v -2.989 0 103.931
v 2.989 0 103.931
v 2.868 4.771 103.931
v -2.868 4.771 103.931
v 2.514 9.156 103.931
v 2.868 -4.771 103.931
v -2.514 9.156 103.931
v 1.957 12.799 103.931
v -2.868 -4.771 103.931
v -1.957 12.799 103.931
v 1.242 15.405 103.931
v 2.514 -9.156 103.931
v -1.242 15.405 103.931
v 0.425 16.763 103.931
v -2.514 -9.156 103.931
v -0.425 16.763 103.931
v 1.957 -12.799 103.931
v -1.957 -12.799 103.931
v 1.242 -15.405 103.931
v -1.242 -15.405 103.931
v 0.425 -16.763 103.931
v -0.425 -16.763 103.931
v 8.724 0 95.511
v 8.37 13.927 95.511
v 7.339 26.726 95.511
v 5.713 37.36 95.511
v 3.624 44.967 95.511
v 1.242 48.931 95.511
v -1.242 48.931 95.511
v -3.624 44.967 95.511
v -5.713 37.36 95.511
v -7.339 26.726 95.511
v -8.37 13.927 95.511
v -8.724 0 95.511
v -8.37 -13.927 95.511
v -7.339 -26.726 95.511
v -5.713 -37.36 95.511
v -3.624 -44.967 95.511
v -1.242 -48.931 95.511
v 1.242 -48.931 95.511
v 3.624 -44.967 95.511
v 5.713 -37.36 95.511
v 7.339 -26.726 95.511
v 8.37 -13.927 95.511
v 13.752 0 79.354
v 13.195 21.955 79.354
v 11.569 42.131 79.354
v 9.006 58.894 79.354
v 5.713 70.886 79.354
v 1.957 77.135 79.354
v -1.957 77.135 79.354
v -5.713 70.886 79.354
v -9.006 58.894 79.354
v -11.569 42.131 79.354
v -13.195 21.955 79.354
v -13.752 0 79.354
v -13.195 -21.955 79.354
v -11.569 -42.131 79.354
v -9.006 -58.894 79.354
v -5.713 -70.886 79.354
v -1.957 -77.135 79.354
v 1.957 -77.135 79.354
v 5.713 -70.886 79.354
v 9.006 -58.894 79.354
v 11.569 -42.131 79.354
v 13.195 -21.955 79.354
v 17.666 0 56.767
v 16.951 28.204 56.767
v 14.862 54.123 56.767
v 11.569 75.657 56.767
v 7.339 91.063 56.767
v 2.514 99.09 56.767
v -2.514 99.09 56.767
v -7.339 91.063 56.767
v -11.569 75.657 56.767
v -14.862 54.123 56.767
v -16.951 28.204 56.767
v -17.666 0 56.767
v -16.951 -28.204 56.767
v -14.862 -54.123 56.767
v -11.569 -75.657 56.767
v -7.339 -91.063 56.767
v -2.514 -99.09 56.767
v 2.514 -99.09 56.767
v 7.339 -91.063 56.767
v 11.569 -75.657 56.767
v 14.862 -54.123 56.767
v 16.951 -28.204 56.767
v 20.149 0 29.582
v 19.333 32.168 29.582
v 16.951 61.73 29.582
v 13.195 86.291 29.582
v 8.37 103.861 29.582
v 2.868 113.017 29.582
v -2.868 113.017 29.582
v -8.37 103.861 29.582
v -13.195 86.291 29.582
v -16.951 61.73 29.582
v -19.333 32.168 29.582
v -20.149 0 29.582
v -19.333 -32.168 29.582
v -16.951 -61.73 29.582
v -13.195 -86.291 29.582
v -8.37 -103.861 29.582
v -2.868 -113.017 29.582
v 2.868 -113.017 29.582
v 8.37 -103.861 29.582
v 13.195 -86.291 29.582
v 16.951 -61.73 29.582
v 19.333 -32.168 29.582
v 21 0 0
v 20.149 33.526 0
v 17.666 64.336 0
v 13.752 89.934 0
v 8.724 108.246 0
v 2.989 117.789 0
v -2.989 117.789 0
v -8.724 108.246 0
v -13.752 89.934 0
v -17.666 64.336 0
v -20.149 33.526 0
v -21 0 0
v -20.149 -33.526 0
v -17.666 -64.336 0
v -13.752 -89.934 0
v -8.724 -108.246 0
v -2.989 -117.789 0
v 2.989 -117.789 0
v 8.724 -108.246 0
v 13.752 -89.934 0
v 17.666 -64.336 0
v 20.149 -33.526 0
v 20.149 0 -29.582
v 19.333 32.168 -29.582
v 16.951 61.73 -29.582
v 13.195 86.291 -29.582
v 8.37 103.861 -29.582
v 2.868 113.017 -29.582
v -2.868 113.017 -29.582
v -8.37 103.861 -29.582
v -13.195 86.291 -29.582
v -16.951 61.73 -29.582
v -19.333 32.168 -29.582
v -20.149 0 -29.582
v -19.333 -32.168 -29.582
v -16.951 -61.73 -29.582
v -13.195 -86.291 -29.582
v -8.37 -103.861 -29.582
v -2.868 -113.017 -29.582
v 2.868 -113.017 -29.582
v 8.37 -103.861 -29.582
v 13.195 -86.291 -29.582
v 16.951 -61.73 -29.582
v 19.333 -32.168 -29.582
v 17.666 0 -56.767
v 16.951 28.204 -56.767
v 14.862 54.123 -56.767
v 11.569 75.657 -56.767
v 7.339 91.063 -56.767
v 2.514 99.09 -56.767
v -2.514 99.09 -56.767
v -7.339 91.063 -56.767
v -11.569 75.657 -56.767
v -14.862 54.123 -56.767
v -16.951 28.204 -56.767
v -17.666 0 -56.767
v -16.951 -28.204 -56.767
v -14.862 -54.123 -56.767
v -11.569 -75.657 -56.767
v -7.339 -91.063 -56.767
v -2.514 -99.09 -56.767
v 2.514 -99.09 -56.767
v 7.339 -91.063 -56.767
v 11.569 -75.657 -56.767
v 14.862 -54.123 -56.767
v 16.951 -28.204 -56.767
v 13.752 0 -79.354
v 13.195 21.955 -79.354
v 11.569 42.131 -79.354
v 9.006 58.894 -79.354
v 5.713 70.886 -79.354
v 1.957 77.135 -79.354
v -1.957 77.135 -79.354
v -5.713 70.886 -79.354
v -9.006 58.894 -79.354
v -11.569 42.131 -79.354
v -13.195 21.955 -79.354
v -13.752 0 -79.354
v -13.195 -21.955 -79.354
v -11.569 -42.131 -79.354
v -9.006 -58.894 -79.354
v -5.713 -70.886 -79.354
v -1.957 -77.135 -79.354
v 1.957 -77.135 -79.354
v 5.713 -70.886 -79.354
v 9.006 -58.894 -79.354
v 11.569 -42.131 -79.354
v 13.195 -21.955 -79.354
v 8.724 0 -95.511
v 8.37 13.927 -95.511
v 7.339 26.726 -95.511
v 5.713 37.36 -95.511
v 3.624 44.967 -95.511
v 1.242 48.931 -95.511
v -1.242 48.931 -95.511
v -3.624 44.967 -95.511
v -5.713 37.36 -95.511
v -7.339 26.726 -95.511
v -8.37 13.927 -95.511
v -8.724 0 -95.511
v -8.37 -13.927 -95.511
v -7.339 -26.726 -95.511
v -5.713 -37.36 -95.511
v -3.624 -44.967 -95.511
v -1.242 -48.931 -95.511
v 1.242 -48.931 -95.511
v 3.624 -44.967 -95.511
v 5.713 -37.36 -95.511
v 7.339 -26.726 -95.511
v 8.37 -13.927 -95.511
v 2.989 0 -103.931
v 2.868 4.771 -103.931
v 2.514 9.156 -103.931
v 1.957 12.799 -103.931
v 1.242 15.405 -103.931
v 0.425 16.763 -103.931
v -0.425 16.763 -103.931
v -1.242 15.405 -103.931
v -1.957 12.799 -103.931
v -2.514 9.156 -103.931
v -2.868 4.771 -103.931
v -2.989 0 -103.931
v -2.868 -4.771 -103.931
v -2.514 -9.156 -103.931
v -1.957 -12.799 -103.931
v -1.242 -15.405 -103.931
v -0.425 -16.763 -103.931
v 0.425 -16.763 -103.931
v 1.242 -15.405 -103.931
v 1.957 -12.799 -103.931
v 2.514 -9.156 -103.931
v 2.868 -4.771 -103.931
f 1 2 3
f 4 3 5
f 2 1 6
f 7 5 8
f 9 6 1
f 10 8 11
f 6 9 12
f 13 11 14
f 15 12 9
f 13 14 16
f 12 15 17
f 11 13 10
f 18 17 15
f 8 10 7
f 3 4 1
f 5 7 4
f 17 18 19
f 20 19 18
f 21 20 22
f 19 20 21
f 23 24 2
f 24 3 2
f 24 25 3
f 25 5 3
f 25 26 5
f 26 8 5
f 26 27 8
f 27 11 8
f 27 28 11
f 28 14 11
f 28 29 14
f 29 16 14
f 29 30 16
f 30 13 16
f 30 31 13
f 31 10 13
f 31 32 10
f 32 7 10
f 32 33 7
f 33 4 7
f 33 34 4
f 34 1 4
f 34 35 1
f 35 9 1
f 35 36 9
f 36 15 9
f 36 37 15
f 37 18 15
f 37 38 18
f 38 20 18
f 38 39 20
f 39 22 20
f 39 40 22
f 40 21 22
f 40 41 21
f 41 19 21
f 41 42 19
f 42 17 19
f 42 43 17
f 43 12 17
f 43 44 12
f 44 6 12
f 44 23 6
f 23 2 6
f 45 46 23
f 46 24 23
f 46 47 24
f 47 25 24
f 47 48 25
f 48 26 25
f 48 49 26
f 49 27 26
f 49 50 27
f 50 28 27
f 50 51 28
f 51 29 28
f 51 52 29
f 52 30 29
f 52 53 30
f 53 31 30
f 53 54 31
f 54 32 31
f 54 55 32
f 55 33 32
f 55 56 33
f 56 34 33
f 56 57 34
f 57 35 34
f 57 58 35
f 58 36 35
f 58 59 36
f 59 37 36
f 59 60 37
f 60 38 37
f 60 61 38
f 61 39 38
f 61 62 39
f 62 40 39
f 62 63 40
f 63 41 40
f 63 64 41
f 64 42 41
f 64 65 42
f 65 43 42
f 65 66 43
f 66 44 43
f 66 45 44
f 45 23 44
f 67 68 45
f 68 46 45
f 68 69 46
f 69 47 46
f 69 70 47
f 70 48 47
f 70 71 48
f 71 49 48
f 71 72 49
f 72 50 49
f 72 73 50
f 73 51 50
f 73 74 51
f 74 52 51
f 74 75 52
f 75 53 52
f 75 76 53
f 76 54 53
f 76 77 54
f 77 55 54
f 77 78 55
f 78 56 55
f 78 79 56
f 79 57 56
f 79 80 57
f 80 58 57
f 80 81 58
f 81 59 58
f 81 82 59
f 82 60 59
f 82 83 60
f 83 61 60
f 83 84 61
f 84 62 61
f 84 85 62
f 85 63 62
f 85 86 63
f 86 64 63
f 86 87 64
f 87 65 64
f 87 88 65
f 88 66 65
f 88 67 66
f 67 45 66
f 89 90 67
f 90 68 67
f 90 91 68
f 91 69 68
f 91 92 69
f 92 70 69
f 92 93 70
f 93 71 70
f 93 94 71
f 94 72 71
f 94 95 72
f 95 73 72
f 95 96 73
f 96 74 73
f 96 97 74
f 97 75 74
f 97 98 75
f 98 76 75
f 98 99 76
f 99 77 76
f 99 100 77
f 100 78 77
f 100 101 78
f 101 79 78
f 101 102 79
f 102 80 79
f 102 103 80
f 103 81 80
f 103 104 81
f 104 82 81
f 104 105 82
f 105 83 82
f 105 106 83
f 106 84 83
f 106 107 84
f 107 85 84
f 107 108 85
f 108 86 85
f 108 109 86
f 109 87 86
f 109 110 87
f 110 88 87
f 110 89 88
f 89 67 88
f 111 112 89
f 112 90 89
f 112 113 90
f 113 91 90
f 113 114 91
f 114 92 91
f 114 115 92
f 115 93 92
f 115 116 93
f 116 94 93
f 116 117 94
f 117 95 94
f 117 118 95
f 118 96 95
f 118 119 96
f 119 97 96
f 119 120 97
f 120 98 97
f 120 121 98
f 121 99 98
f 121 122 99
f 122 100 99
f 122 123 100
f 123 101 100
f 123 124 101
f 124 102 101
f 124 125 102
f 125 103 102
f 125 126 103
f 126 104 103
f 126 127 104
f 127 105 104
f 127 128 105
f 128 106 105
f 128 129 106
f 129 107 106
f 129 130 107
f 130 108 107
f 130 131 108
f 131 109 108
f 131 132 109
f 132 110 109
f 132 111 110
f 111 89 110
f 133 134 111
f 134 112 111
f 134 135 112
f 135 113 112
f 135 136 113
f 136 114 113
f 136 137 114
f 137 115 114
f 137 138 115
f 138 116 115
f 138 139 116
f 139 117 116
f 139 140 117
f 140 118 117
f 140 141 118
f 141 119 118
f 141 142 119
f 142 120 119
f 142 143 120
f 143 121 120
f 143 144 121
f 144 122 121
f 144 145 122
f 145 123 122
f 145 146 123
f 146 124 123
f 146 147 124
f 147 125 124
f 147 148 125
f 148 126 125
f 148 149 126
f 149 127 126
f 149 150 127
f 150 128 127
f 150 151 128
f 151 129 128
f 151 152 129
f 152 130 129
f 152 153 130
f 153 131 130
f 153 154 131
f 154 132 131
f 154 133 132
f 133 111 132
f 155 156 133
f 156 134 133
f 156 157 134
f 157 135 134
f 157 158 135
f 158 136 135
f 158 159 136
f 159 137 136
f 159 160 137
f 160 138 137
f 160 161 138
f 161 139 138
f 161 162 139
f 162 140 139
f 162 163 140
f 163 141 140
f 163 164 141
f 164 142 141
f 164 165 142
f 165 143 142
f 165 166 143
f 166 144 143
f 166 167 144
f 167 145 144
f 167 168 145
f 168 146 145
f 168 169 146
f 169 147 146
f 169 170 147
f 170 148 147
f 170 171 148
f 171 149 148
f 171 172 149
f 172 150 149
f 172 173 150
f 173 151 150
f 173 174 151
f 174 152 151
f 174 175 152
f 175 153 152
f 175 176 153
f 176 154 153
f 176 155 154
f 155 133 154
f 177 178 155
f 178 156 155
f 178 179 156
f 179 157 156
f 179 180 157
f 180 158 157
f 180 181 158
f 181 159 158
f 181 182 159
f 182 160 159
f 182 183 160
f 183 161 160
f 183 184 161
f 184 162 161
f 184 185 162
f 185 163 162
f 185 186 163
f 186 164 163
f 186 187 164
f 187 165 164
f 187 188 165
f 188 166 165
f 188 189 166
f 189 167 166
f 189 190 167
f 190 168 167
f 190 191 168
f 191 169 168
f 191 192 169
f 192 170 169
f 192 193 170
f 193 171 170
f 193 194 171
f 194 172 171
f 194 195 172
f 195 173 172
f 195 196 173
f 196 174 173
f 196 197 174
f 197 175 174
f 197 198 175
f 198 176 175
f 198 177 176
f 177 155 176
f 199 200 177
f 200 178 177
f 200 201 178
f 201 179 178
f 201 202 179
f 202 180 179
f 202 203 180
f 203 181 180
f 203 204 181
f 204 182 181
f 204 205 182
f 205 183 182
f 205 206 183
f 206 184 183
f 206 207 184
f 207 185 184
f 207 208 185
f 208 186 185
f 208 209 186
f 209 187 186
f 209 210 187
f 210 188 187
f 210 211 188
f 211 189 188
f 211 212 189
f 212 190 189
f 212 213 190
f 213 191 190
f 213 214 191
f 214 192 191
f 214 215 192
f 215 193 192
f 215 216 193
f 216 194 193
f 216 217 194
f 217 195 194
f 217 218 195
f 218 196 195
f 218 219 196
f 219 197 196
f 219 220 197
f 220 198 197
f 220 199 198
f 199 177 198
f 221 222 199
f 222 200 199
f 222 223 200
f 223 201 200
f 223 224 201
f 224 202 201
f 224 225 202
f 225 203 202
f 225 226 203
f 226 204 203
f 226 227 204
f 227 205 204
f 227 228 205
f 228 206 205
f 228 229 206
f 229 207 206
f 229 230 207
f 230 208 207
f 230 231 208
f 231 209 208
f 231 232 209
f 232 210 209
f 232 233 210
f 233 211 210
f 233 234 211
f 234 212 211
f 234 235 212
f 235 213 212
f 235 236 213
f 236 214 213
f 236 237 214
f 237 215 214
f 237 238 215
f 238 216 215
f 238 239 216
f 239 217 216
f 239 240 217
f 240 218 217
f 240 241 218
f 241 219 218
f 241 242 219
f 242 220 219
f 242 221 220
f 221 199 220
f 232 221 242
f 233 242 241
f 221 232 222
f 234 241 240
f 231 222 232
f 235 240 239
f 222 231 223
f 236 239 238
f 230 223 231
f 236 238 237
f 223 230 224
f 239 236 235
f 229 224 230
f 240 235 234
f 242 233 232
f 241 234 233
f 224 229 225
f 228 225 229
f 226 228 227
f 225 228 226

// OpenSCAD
// Generated by SolidPython 1.0.1 on 2020-07-29 00:46:46


scale(v = [3, 17, 15]) {
	sphere(r = 7);
}
/***********************************************
*********      SolidPython code:      **********
************************************************
 
# import packages: SolidPython
from solid import *
from solid.utils import *
from itertools import chain, combinations, permutations


class Resize:

    def __init__(self, scad_file):
        self.scad_file = scad_file
        #self.scad_file = import_scad(scad_file)
        # cone/cylinder param:
        self.r1 = 0
        self.r2 = 0
        self.h = 0
        # rectangular prism param:
        self.w = 0
        self.l = 0
        # ellipse param:
        self.r = 0

    # import OpenScad code (file name corresponds to shape)


    # classify shape + parameters
    def assign(self, param1, param2, param3):
        if self.scad_file == 'cone.scad':
            self.r1 = param1
            self.r2 = param2
            self.h = param3
        elif self.scad_file == 'cylinder.scad':
            self.r1 = param1
            self.r2 = param2
            self.h = param3
        elif self.scad_file == 'rectangularPrism.scad':
            self.h = param1
            self.l = param2
            self.w = param3
        else:
            self.r = param1
            self.h = param2

    # resize parameters
    def iterate(self):
        x = range(3, 20, 2)
        i = 1
        if self.scad_file == 'cone.scad':
            tempList = list(permutations(x, 2))
            for temp in tempList:
                param1 = temp[0]
                param2 = temp[1]
                filepath = 'produced_scad_files/' + 'cone' + str(param1) + '_' + str(param2) + '_' + '.scad'
                scad_render_to_file(cylinder(h=param1, r1=param2, r2=0), filepath)

        elif self.scad_file == 'cylinder.scad':
            tempList = list(permutations(x, 3))
            for temp in tempList:
                param1 = temp[0]
                param2 = temp[1]
                filepath = 'produced_scad_files/' + 'cylinder' + str(param1) + '_' + str(param2) + '_' + '.scad'
                scad_render_to_file(cylinder(h=param1, r1=param2, r2=param2), filepath)

        elif self.scad_file == 'rectangularPrism.scad':
            tempList = list(permutations(x, 3))
            for temp in tempList:
                param1 = temp[0]
                param2 = temp[1]
                param3 = temp[2]
                filepath = 'produced_scad_files/' + 'rectangularPrism' + str(param1) + '_' + str(param2) + '_' + str(
                    param3) + '.scad'
                scad_render_to_file(cube(size=(param1, param2, param3)), filepath)

        elif self.scad_file == 'ellipse.scad':
            tempList = list(permutations(x, 4))
            for temp in tempList:
                param1 = temp[0]
                param2 = temp[1]
                param3 = temp[2]
                param4 = temp[3]
                filepath = 'produced_scad_files/' + 'ellipse' + str(param1) + '_' + str(param2) + '_' + str(param3) + '_' + str(param4) + '.scad'
                scad_render_to_file(scale([param1, param2, param3])(sphere(r=param4)), filepath)

    def render_to_scadfile(self):
        scad_render_to_file(scad, 'example.scad') 
 
************************************************/
